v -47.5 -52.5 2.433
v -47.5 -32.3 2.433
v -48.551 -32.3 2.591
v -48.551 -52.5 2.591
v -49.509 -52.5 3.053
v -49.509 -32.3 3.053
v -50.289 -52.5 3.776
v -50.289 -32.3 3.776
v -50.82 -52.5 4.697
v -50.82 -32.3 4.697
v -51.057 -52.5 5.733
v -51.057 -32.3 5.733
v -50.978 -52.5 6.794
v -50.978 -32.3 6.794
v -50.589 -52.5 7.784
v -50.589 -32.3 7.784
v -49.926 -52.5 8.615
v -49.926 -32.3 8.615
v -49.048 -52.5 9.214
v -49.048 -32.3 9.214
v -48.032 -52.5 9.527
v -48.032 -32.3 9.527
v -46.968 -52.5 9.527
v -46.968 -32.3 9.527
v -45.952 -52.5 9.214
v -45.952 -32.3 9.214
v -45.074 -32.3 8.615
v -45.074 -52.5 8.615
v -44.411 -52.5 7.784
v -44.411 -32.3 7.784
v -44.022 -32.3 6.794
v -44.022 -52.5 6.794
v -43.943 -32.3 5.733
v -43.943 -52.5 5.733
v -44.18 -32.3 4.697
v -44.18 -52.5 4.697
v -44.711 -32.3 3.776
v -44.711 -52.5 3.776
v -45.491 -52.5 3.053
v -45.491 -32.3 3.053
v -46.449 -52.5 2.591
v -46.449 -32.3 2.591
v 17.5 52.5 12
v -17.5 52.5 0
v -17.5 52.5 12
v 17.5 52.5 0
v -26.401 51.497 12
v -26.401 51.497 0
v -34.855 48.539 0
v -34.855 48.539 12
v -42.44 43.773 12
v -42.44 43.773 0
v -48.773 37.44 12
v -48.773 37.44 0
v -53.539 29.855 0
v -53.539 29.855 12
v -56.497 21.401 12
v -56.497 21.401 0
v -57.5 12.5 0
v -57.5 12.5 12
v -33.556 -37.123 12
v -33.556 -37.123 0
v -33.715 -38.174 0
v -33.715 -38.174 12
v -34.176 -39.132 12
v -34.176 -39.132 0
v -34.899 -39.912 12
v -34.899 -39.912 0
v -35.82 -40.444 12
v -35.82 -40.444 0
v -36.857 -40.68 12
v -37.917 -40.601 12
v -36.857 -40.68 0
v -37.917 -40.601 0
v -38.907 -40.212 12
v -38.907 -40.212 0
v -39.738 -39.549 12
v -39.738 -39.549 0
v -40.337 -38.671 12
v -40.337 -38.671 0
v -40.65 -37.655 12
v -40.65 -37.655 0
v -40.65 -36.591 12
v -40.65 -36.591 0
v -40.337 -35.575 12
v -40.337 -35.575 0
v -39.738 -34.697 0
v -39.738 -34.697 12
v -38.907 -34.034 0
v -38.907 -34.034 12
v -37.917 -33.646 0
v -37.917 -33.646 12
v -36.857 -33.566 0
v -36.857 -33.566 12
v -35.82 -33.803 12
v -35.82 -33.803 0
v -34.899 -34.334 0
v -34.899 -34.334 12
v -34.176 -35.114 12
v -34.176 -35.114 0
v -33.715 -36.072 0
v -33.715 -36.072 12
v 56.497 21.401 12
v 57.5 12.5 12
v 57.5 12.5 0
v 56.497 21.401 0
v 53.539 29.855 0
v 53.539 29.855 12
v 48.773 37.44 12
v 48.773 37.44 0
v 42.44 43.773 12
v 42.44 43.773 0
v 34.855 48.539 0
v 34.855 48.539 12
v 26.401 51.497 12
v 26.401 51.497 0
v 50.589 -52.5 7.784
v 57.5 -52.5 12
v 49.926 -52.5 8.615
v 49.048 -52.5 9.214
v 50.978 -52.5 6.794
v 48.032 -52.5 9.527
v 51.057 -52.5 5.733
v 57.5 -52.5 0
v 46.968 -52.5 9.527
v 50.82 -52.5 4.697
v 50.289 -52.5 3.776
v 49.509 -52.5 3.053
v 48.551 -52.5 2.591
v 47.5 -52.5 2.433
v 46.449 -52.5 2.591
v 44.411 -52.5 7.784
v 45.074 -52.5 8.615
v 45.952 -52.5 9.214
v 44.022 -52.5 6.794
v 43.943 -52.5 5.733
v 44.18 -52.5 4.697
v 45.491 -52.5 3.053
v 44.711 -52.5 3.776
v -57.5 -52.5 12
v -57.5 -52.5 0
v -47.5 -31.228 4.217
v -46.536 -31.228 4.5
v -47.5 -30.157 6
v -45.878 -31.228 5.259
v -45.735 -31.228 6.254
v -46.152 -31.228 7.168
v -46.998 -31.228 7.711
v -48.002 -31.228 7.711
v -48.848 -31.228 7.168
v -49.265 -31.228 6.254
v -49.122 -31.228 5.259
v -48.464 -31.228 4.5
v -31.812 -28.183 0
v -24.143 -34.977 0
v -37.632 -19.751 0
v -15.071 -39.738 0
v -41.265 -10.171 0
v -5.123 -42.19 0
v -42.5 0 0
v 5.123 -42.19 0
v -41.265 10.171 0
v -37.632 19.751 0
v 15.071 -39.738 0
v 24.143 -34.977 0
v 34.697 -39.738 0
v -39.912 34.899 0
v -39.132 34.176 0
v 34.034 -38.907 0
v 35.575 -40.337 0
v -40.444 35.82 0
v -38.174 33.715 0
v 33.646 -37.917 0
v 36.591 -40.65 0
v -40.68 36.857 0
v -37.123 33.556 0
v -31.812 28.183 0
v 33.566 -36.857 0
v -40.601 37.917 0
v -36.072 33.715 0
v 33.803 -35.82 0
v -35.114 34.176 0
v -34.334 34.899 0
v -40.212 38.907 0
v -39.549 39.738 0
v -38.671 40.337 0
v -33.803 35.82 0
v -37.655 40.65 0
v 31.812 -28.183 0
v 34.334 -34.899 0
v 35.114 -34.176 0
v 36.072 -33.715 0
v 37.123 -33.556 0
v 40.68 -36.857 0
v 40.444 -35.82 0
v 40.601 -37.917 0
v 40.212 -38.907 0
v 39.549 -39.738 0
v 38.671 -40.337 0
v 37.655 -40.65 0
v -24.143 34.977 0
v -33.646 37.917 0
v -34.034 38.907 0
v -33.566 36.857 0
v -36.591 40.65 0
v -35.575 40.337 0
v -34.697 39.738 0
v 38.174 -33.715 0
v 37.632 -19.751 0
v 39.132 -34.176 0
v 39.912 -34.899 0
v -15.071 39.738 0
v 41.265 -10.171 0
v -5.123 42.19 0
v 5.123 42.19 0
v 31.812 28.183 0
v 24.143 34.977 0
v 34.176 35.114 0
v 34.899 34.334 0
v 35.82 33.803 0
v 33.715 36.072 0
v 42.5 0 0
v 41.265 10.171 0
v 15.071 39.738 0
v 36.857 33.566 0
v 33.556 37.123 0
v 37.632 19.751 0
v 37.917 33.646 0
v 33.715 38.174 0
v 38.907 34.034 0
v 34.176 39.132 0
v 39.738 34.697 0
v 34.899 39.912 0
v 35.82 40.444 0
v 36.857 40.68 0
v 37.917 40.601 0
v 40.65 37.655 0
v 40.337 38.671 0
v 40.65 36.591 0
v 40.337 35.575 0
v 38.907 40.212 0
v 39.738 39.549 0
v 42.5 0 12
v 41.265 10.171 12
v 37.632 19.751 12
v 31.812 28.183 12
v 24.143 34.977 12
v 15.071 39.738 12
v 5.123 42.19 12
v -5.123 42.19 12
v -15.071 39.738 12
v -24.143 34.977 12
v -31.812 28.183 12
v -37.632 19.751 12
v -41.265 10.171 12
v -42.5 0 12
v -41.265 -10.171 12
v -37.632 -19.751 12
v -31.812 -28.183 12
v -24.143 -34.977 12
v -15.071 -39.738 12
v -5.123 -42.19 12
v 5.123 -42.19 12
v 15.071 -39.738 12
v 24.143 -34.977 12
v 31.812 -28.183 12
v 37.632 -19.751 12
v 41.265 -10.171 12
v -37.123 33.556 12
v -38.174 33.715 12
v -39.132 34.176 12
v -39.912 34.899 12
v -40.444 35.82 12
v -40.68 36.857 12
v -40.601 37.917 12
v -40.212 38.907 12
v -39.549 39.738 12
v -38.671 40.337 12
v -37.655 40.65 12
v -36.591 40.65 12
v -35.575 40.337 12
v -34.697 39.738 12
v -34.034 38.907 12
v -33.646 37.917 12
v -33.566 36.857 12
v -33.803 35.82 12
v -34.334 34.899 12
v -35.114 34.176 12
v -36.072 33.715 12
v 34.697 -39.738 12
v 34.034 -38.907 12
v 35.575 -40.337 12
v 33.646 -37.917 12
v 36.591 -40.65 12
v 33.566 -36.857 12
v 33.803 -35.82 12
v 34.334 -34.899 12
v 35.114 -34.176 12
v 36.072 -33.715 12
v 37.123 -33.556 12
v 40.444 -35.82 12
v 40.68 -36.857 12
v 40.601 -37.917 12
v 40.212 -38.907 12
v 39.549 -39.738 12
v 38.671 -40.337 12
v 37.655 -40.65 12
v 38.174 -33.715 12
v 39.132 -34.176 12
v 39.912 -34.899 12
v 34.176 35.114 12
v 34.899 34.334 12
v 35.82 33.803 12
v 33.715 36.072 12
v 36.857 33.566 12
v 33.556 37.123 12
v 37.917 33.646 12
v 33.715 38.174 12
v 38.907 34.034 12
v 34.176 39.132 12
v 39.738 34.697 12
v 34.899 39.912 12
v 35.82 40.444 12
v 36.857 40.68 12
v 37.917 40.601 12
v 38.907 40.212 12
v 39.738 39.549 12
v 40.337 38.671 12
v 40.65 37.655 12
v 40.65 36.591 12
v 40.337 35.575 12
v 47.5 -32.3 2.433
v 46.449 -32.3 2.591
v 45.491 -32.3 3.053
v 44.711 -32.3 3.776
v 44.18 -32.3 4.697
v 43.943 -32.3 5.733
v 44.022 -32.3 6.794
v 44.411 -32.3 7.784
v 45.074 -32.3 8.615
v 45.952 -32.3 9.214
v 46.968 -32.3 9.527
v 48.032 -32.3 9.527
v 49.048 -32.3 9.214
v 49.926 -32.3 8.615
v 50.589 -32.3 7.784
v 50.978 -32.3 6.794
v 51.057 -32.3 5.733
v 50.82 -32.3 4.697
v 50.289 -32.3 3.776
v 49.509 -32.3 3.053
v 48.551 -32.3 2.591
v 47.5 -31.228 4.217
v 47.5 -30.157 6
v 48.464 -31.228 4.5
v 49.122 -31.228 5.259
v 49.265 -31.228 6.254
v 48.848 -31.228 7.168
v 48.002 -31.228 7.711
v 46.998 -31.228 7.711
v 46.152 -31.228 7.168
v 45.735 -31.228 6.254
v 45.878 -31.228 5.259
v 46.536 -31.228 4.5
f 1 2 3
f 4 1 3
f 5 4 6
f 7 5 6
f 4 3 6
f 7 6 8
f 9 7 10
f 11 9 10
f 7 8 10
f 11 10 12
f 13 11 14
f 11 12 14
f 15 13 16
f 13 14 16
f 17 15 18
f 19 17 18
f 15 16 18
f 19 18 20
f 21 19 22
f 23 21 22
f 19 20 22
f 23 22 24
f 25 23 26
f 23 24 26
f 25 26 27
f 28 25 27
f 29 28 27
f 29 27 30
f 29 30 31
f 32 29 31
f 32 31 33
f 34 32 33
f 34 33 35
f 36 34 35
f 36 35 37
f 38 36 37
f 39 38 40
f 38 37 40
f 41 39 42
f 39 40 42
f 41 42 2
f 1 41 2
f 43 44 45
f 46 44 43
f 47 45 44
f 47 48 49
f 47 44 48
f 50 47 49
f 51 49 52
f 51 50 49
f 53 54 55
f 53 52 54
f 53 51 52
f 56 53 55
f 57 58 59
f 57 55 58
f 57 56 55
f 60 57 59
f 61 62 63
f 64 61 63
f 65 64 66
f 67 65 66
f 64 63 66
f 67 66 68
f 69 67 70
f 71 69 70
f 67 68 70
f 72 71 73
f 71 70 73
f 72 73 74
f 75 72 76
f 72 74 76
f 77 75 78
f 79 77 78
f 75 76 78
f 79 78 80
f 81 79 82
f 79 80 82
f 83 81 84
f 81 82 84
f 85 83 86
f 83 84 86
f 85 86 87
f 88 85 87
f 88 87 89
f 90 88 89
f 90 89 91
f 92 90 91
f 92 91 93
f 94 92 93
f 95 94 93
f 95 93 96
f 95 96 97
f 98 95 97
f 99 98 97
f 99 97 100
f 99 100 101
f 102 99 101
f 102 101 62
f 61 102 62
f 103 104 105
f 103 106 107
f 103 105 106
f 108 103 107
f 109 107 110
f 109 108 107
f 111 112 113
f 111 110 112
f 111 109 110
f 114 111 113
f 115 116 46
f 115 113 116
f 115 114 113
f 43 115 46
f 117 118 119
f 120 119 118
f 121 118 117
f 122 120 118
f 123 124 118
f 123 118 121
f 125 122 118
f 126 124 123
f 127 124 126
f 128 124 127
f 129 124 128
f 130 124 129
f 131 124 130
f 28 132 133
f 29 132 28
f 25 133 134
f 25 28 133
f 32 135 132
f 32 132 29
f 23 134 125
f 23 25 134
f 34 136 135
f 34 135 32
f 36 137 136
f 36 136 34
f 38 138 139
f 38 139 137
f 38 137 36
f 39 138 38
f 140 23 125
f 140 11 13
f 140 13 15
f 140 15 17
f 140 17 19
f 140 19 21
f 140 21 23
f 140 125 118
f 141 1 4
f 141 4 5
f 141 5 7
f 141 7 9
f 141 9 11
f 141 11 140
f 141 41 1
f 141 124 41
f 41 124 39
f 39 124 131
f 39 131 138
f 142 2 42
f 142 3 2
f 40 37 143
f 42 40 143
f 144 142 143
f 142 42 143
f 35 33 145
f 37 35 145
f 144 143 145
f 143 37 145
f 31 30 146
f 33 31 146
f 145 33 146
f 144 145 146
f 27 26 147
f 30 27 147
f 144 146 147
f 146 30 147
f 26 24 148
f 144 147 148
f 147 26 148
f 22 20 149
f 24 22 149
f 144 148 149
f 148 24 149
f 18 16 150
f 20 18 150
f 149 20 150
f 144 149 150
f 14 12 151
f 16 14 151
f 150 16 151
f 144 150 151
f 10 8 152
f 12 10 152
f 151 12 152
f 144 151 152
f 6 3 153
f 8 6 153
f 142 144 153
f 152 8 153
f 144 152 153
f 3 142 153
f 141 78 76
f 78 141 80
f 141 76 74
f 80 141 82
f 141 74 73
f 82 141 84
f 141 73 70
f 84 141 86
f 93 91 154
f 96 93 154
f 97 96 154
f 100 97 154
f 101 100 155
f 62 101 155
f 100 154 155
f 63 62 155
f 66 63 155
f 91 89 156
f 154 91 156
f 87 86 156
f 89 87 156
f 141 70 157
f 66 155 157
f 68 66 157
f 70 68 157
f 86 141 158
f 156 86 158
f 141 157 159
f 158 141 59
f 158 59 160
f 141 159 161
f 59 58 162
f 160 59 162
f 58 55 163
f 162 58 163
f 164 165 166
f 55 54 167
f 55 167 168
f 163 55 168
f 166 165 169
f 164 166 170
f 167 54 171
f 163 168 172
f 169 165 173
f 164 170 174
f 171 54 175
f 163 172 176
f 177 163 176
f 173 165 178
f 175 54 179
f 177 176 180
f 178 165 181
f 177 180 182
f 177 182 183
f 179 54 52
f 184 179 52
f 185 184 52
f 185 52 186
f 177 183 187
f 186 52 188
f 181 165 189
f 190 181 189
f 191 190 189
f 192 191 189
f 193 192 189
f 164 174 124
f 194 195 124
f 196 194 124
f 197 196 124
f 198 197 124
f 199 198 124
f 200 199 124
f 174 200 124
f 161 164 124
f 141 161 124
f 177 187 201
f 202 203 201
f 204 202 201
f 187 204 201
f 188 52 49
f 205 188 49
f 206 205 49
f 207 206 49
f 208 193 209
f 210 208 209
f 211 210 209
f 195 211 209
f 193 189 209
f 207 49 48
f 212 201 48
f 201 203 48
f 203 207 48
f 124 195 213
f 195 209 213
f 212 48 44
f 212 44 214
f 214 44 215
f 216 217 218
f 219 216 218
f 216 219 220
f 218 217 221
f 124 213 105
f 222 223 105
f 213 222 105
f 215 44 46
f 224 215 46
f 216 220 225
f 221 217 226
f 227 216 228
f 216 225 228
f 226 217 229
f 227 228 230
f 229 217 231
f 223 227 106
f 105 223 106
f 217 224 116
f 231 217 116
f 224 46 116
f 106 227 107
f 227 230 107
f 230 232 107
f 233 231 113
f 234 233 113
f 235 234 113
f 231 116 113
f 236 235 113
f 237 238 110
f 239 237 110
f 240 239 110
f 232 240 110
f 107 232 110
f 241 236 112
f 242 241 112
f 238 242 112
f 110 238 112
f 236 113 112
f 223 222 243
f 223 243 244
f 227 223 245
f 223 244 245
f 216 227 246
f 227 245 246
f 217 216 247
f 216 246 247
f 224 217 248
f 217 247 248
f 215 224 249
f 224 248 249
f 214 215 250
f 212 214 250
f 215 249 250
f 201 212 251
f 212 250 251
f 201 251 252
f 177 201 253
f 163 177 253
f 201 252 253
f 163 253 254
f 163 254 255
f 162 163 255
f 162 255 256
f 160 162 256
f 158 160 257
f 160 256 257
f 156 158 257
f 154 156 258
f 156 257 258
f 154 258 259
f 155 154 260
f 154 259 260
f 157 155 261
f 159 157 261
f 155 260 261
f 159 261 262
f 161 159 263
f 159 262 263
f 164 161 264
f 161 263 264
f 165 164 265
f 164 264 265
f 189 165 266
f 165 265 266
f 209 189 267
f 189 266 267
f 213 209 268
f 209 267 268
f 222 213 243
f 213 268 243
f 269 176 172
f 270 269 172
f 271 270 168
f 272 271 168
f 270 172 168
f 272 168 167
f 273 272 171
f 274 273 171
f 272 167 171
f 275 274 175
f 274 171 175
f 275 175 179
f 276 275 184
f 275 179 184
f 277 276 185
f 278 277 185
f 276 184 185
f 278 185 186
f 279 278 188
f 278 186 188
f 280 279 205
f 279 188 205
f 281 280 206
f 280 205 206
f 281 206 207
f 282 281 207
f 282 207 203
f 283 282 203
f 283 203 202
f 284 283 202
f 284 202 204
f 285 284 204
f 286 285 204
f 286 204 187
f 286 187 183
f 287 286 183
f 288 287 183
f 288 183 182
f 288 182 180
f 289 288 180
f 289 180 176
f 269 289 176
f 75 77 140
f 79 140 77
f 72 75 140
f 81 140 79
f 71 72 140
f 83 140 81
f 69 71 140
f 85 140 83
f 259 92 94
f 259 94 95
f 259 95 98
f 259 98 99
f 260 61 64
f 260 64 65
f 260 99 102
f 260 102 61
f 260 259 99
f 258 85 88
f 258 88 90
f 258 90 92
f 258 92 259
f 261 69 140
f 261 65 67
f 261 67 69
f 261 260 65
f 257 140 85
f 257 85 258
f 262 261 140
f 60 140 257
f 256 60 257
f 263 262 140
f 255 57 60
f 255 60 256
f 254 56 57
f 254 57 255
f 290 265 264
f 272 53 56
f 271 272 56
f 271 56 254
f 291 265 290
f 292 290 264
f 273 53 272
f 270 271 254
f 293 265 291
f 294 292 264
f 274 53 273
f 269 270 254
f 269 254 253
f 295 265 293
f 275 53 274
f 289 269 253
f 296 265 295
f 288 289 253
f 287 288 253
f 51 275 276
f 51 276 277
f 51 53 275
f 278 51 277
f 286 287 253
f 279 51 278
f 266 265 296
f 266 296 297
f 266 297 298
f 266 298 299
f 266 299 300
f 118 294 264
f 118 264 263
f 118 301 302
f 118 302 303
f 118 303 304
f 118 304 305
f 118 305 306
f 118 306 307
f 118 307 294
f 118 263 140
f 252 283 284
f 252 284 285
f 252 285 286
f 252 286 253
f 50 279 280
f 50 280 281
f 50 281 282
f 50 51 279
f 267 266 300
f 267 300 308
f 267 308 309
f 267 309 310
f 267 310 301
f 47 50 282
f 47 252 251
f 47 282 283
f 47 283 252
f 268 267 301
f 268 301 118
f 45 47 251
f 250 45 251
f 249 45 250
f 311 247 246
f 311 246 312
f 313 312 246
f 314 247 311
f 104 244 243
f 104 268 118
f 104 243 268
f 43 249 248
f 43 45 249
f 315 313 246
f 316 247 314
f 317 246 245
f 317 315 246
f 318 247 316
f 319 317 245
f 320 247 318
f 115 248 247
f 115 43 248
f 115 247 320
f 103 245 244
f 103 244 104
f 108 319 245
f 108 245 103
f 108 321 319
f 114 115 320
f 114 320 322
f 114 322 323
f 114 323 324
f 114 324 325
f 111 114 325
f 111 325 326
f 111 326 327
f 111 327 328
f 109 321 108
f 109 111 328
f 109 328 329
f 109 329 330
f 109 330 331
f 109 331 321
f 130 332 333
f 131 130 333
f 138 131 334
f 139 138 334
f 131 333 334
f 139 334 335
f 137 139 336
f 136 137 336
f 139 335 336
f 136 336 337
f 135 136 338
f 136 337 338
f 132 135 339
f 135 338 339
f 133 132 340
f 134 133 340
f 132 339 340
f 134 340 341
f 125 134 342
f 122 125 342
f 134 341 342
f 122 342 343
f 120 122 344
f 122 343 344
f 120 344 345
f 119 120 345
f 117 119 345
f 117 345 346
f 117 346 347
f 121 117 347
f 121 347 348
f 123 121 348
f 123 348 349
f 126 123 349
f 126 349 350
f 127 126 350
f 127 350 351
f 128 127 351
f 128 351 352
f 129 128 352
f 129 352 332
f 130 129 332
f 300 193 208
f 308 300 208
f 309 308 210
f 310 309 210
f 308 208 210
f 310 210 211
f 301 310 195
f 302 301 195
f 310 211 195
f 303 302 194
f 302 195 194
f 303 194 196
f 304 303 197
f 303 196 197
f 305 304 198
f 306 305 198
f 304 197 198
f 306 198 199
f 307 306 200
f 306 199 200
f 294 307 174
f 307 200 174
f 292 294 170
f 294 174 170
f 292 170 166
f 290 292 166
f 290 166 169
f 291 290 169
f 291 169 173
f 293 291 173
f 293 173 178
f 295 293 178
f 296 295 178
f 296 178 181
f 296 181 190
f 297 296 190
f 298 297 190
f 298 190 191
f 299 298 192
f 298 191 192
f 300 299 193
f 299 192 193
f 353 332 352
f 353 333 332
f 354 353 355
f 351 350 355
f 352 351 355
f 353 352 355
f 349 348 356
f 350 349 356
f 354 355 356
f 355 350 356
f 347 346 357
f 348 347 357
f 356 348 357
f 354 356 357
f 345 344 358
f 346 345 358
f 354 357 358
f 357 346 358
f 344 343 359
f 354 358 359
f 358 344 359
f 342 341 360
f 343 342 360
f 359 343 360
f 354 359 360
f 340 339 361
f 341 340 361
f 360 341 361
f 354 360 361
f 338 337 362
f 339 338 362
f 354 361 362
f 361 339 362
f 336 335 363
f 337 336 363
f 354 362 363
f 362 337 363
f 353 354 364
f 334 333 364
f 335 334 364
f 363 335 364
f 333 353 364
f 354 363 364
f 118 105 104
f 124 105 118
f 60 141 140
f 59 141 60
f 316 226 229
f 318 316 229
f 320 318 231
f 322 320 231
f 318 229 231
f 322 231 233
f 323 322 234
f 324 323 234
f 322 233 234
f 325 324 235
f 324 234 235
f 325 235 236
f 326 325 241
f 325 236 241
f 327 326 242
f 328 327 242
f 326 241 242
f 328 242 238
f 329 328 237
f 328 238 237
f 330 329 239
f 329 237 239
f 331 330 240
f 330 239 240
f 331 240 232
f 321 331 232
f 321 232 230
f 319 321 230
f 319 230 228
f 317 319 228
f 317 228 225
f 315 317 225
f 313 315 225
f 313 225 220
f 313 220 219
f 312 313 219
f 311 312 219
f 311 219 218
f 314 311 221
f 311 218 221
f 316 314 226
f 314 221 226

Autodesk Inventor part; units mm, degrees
ref_plane "YZ Plane" through (0, 0, 0) normal (1, 0, 0) x (0, 1, 0)
ref_plane "XZ Plane" through (0, 0, 0) normal (0, 1, 0) x (-1, 0, 0)
ref_plane "XY Plane" through (0, 0, 0) normal (0, 0, 1) x (1, 0, 0)
sketch "Sketch1" plane through (0, 0, 0) normal (0, 0, 1) x (1, 0, 0)
  line L0 (57.5, -52.5) -> (-57.5, -52.5)
  line L1 (-57.5, -52.5) -> (-57.5, 52.5)
  line L2 (-57.5, 52.5) -> (57.5, 52.5)
  line L3 (57.5, 52.5) -> (57.5, -52.5)
  line L4 (57.5, -52.5) -> (-57.5, 52.5) construction
  line L5 (-57.5, -52.5) -> (57.5, 52.5) construction
  point P0 (0, 0)
  dimension "d0" = 115
  dimension "d1" = 105
extrude "Extrusion1" add sketch "Sketch1" along normal blind 12
fillet "Fillet1" radius 40 2 edges at (-57.5, 52.5, 6) (57.5, 52.5, 6)
sketch "Sketch2" plane through (-57.5, -52.5, 0) normal (0, -1, 0) x (1, 0, 0)
  line L0 (0, 0) -> (0, 12) projected
  line L1 (115, 0) -> (115, 12) projected
  line L2 (0, 12) -> (115, 12) projected
  point P0 (57.5, 0)
  point P1 (10, 6)
  point P2 (105, 6)
  dimension "d5" = 10
  dimension "d6" = 10
  dimension "d7" = 6
  dimension "d8" = 6
hole "Hole1" at (-47.5, -52.5, 6) at (47.5, -52.5, 6) direction (0, 1, 0) diameter 7.134 depth 20.2 tip angle 118 thread size "M8x0.8" class "6H" standard "ISO Metric profile"
sketch "Sketch3" plane through (0, 0, 12) normal (0, 0, 1) x (1, 0, 0)
  circle A0 centre (0, 0) radius 42.5
  dimension "d16" = 85
extrude "Extrusion2" cut sketch "Sketch3" against normal blind 12
sketch "Sketch4" plane through (0, 0, 12) normal (0, 0, 1) x (1, 0, 0)
  circle A0 centre (0, 0) radius 52.5 construction
  line L0 (0, 0) -> (-64.3477, 64.3477) construction
  line L1 (0, 0) -> (91.0013, 0) construction
  point P0 (-37.1231, 37.1231)
  dimension "d19" = 105
  dimension "d20" = 135
hole "Hole2" at (-37.1231, 37.1231, 12) direction (0, 0, -1) diameter 7.134 depth 20.2 tip angle 118 thread size "M8x0.8" class "6H" standard "ISO Metric profile"
pattern_circular "Circular Pattern1" count 4 over 360 about axis through (0, 0, -10) along (0, 0, 1) of "Hole2"
properties part number "Gear_support_wheel"
